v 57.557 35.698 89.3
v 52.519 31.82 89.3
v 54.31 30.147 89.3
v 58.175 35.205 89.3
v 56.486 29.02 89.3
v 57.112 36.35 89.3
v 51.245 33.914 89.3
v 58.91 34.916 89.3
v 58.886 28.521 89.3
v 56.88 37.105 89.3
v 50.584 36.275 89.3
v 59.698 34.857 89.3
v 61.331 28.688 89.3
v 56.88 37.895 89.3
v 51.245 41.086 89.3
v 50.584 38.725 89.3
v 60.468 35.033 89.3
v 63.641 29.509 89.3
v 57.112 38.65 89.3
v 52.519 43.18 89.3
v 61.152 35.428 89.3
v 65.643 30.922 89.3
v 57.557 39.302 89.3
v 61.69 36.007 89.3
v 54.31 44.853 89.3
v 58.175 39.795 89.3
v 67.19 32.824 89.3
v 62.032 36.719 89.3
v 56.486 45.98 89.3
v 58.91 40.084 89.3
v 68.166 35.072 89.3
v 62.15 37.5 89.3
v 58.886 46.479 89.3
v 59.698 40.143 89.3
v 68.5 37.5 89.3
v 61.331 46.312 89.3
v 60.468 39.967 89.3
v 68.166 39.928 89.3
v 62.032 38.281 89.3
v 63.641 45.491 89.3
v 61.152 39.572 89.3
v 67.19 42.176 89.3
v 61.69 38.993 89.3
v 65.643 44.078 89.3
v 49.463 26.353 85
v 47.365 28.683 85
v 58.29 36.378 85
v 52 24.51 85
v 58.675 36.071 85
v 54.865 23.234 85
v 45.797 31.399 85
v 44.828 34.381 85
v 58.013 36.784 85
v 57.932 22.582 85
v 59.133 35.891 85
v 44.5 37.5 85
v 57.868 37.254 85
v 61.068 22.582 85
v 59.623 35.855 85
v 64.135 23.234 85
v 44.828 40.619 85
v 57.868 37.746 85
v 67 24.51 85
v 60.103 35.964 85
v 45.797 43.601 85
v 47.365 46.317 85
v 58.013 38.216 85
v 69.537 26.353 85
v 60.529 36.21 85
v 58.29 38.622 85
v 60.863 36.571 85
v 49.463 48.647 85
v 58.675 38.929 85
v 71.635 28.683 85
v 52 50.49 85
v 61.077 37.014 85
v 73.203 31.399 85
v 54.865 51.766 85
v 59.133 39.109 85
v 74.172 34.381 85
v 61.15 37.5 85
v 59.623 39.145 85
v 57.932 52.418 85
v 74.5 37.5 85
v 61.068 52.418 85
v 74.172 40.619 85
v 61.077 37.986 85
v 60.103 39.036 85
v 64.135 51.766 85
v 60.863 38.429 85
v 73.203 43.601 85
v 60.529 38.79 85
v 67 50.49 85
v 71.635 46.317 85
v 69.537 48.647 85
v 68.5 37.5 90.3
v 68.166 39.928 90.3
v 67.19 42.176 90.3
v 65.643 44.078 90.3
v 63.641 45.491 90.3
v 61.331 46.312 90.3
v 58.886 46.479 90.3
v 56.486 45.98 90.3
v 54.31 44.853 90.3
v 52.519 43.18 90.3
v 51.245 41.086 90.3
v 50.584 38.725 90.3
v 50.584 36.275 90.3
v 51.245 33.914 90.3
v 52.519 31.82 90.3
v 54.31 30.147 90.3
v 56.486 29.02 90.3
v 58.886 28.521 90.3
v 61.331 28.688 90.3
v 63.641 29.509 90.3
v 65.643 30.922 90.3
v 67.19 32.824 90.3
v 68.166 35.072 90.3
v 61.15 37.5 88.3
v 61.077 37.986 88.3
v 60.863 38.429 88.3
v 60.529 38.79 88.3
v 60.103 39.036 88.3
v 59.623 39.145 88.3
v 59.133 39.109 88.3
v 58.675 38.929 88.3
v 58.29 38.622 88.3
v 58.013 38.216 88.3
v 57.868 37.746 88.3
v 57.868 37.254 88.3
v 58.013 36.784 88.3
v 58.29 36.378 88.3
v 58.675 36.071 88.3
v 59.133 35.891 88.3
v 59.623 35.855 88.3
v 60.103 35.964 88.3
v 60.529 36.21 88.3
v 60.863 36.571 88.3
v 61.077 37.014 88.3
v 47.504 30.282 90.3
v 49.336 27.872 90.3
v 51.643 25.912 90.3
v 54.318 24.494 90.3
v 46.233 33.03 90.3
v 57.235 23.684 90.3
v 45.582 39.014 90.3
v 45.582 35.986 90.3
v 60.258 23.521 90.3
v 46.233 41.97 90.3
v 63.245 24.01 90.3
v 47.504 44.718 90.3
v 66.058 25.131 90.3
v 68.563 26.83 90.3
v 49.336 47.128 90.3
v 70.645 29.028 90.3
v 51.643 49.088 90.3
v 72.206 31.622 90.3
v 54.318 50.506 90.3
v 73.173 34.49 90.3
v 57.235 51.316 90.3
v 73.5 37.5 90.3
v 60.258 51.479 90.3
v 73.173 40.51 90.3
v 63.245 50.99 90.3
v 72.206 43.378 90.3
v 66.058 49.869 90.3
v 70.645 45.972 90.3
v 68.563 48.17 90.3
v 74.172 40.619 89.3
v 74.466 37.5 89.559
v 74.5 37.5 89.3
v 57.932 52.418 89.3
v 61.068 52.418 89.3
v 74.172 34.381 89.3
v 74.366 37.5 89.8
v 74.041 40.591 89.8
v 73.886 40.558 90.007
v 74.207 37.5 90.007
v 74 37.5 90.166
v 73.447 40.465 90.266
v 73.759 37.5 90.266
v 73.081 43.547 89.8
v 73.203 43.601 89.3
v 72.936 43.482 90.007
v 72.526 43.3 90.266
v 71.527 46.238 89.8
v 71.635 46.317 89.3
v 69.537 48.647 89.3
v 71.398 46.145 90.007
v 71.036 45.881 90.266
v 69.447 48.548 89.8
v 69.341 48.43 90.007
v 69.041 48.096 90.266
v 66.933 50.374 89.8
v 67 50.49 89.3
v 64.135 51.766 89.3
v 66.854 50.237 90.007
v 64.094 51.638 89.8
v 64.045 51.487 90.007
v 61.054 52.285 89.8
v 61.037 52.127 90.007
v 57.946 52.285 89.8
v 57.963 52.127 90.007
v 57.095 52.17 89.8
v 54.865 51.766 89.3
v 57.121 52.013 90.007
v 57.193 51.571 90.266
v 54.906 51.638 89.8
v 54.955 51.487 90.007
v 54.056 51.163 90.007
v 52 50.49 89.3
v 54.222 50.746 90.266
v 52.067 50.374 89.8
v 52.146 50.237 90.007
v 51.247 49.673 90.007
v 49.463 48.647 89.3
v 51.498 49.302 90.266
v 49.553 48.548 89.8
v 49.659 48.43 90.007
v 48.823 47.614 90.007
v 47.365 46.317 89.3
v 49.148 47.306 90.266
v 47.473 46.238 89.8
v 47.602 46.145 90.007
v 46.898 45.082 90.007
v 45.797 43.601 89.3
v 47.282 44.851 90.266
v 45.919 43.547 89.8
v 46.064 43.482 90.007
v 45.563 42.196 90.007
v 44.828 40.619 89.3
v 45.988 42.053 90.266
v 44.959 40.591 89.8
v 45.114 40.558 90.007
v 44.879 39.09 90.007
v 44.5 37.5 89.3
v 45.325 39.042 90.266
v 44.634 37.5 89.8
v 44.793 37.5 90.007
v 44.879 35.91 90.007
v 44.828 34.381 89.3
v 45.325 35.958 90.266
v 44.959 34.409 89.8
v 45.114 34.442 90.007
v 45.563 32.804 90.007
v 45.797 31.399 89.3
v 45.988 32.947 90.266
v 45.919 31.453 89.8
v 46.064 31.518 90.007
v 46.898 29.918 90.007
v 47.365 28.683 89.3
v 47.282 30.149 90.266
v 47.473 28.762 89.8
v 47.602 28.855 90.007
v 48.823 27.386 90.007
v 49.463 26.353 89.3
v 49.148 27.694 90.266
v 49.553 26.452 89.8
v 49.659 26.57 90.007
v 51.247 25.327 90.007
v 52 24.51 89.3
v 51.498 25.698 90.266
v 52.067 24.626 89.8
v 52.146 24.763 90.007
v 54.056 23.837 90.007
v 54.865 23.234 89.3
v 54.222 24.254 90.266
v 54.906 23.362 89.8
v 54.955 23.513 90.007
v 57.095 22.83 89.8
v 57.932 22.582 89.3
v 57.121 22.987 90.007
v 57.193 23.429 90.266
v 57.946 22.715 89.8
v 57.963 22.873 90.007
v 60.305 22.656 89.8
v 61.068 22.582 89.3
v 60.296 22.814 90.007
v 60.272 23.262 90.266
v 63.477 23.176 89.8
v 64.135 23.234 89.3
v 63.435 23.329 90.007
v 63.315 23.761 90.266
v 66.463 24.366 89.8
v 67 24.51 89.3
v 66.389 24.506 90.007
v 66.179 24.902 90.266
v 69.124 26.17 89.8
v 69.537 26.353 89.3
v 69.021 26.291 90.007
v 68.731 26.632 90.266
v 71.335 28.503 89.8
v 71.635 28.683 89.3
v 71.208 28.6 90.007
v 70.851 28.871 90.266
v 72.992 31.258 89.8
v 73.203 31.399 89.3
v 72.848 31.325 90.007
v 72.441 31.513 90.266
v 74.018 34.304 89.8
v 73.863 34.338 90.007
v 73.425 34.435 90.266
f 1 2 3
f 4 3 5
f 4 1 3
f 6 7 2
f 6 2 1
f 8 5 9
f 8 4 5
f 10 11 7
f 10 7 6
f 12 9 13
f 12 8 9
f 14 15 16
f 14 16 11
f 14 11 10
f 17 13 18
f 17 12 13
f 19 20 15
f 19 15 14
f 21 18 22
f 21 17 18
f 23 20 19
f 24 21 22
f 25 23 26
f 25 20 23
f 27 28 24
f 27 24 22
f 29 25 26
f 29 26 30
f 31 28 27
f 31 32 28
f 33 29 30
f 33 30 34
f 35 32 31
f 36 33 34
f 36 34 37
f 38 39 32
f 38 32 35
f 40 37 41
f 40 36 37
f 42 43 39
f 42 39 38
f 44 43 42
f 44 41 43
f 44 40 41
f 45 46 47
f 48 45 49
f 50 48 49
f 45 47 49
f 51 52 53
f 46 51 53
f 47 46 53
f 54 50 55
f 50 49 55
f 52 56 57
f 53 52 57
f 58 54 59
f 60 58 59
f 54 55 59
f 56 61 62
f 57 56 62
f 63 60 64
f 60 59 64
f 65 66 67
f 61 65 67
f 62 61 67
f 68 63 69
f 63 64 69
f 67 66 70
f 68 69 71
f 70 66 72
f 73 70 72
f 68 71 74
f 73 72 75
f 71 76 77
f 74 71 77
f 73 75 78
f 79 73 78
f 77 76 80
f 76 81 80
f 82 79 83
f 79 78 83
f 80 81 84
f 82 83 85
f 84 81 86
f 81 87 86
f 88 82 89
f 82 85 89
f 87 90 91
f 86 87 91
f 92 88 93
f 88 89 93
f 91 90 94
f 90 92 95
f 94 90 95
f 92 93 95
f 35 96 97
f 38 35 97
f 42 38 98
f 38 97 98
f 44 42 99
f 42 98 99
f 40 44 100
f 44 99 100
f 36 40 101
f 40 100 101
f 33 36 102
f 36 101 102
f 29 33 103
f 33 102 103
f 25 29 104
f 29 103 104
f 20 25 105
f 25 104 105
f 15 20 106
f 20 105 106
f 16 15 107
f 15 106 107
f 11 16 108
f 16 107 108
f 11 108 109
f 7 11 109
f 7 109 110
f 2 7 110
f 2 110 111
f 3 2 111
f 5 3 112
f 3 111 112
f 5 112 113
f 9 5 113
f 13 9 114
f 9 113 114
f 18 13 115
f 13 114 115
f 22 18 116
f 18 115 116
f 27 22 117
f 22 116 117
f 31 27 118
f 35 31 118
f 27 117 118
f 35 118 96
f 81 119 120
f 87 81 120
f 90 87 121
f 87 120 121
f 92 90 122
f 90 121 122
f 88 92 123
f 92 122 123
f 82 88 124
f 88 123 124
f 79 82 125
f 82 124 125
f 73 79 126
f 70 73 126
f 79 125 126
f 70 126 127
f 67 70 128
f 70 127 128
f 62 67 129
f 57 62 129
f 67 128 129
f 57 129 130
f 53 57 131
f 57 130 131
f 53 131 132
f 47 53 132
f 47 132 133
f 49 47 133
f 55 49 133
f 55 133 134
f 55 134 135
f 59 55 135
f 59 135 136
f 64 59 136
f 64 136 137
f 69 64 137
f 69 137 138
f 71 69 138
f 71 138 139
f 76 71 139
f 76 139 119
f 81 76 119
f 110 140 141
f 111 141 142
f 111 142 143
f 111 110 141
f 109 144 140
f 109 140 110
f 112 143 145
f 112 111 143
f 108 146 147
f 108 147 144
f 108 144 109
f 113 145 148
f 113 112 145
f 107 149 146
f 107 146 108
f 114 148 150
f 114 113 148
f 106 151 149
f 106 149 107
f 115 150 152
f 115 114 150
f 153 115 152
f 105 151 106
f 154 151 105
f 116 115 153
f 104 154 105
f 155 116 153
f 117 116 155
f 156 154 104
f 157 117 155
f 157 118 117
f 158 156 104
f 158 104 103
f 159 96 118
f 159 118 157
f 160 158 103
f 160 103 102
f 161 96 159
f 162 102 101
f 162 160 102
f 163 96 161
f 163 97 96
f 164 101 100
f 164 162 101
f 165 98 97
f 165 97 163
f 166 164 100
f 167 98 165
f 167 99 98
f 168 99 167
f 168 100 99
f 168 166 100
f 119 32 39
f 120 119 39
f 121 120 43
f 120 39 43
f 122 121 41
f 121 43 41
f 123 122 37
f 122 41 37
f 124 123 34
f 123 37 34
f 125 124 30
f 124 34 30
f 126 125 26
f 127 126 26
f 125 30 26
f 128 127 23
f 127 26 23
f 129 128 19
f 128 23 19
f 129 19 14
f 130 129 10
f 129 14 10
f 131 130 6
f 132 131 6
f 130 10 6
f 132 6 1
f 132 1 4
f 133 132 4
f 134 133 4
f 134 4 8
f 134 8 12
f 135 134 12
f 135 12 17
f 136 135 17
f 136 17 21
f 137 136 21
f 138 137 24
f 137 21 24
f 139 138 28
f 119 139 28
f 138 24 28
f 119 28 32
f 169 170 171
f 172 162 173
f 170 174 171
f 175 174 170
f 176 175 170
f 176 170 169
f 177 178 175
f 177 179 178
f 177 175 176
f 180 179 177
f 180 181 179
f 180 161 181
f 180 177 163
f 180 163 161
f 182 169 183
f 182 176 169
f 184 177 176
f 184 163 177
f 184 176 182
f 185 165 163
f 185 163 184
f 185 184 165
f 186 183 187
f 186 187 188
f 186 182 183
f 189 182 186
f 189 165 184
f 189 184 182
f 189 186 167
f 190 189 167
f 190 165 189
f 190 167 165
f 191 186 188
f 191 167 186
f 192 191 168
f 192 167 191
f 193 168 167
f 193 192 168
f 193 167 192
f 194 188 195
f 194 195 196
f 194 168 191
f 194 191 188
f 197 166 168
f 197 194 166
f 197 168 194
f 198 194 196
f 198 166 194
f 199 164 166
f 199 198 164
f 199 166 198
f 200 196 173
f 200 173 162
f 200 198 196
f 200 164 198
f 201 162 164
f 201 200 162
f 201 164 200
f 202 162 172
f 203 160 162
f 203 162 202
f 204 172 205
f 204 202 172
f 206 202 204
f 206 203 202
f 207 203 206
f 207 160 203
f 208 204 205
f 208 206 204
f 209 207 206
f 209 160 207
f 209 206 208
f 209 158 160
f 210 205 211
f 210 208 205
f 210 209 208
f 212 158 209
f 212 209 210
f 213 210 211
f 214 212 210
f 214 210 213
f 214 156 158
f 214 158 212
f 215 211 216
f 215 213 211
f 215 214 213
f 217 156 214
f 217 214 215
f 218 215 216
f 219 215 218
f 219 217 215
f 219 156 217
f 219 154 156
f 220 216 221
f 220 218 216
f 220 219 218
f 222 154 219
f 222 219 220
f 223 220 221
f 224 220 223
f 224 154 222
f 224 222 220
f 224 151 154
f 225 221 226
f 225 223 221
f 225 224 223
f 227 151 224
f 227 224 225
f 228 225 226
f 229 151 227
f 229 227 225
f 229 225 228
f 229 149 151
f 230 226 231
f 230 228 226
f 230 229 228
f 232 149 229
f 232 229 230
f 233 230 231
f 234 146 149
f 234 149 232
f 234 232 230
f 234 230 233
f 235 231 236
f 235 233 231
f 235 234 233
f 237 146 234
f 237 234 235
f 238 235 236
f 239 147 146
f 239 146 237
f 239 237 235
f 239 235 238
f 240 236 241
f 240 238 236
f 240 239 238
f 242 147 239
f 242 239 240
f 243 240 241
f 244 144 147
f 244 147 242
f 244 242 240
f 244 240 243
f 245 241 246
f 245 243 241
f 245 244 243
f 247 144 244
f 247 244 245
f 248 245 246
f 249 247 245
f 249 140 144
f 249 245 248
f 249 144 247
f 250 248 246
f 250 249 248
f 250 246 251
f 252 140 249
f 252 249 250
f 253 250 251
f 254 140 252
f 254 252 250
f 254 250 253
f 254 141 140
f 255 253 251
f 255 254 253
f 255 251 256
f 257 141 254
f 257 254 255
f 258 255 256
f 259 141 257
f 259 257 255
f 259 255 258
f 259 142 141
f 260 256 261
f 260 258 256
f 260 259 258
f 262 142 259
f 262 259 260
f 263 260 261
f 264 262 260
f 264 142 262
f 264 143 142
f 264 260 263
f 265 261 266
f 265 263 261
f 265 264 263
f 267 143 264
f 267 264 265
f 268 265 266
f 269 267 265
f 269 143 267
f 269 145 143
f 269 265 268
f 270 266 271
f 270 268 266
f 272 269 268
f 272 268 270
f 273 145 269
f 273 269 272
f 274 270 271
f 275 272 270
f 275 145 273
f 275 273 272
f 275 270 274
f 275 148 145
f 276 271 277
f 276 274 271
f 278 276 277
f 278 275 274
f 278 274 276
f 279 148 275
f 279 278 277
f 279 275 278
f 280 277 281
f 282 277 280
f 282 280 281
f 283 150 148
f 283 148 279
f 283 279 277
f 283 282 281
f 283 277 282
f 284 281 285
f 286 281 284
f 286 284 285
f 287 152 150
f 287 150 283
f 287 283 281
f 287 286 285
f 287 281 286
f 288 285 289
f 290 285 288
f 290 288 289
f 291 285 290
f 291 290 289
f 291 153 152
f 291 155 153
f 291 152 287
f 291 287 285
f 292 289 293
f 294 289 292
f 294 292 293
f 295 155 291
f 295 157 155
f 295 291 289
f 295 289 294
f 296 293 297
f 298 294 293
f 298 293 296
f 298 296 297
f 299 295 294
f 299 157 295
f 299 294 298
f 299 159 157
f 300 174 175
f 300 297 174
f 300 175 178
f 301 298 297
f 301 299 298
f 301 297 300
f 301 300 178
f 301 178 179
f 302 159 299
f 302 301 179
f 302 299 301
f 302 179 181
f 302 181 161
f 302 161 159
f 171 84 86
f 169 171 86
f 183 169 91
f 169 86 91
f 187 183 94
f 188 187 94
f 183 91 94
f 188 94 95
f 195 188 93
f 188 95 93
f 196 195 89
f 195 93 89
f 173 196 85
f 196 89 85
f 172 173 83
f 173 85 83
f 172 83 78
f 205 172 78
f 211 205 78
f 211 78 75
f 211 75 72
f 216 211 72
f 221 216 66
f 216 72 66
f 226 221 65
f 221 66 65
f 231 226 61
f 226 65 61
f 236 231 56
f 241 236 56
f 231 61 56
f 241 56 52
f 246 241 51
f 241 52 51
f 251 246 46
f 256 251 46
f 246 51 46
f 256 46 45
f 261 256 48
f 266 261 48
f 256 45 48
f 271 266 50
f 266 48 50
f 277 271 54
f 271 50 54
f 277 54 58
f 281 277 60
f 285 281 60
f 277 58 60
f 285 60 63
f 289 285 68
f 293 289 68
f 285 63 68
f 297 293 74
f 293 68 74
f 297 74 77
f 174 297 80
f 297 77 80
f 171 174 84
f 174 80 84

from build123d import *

# Parameters (mm, degrees)
SKETCH035_R     = 15
PAD013_DEPTH    = 5.3
SKETCH036_R     = 9
POCKET019_DEPTH = 1
SKETCH037_R     = 1.65
POCKET020_DEPTH = 5
FILLET008_R     = 1
CHAMFER003_SIZE = 1


with BuildPart() as part:
    # Sketch035 → Pad013 (new body)
    with BuildSketch(Plane.XY):
        Circle(SKETCH035_R)
    extrude(amount=PAD013_DEPTH)

    # Sketch036 → Pocket019 (cut)
    with BuildSketch(Plane.XY.offset(5.3)):
        Circle(SKETCH036_R)
    extrude(amount=-POCKET019_DEPTH, mode=Mode.SUBTRACT)

    # Sketch037 (on Face5 of Pocket019) → Pocket020 (cut)
    with BuildSketch(Plane.XY.offset(4.3)):
        Circle(SKETCH037_R)
    extrude(amount=-POCKET020_DEPTH, mode=Mode.SUBTRACT)

    # Fillet008
    fillet008_edges = [part.edges().sort_by_distance(p)[0] for p in [
        (-15, 0, 5.3),
    ]]
    fillet(fillet008_edges, radius=FILLET008_R)

    # Chamfer003
    chamfer003_edges = [part.edges().sort_by_distance(p)[0] for p in [
        (-1.65, 0, 4.3),
    ]]
    chamfer(chamfer003_edges, length=CHAMFER003_SIZE)


with BuildPart() as part_1:
    # Body009 placement: moved
    add(part.part.moved(Location((59.5, 37.5, 85))))


solid = part_1.part
